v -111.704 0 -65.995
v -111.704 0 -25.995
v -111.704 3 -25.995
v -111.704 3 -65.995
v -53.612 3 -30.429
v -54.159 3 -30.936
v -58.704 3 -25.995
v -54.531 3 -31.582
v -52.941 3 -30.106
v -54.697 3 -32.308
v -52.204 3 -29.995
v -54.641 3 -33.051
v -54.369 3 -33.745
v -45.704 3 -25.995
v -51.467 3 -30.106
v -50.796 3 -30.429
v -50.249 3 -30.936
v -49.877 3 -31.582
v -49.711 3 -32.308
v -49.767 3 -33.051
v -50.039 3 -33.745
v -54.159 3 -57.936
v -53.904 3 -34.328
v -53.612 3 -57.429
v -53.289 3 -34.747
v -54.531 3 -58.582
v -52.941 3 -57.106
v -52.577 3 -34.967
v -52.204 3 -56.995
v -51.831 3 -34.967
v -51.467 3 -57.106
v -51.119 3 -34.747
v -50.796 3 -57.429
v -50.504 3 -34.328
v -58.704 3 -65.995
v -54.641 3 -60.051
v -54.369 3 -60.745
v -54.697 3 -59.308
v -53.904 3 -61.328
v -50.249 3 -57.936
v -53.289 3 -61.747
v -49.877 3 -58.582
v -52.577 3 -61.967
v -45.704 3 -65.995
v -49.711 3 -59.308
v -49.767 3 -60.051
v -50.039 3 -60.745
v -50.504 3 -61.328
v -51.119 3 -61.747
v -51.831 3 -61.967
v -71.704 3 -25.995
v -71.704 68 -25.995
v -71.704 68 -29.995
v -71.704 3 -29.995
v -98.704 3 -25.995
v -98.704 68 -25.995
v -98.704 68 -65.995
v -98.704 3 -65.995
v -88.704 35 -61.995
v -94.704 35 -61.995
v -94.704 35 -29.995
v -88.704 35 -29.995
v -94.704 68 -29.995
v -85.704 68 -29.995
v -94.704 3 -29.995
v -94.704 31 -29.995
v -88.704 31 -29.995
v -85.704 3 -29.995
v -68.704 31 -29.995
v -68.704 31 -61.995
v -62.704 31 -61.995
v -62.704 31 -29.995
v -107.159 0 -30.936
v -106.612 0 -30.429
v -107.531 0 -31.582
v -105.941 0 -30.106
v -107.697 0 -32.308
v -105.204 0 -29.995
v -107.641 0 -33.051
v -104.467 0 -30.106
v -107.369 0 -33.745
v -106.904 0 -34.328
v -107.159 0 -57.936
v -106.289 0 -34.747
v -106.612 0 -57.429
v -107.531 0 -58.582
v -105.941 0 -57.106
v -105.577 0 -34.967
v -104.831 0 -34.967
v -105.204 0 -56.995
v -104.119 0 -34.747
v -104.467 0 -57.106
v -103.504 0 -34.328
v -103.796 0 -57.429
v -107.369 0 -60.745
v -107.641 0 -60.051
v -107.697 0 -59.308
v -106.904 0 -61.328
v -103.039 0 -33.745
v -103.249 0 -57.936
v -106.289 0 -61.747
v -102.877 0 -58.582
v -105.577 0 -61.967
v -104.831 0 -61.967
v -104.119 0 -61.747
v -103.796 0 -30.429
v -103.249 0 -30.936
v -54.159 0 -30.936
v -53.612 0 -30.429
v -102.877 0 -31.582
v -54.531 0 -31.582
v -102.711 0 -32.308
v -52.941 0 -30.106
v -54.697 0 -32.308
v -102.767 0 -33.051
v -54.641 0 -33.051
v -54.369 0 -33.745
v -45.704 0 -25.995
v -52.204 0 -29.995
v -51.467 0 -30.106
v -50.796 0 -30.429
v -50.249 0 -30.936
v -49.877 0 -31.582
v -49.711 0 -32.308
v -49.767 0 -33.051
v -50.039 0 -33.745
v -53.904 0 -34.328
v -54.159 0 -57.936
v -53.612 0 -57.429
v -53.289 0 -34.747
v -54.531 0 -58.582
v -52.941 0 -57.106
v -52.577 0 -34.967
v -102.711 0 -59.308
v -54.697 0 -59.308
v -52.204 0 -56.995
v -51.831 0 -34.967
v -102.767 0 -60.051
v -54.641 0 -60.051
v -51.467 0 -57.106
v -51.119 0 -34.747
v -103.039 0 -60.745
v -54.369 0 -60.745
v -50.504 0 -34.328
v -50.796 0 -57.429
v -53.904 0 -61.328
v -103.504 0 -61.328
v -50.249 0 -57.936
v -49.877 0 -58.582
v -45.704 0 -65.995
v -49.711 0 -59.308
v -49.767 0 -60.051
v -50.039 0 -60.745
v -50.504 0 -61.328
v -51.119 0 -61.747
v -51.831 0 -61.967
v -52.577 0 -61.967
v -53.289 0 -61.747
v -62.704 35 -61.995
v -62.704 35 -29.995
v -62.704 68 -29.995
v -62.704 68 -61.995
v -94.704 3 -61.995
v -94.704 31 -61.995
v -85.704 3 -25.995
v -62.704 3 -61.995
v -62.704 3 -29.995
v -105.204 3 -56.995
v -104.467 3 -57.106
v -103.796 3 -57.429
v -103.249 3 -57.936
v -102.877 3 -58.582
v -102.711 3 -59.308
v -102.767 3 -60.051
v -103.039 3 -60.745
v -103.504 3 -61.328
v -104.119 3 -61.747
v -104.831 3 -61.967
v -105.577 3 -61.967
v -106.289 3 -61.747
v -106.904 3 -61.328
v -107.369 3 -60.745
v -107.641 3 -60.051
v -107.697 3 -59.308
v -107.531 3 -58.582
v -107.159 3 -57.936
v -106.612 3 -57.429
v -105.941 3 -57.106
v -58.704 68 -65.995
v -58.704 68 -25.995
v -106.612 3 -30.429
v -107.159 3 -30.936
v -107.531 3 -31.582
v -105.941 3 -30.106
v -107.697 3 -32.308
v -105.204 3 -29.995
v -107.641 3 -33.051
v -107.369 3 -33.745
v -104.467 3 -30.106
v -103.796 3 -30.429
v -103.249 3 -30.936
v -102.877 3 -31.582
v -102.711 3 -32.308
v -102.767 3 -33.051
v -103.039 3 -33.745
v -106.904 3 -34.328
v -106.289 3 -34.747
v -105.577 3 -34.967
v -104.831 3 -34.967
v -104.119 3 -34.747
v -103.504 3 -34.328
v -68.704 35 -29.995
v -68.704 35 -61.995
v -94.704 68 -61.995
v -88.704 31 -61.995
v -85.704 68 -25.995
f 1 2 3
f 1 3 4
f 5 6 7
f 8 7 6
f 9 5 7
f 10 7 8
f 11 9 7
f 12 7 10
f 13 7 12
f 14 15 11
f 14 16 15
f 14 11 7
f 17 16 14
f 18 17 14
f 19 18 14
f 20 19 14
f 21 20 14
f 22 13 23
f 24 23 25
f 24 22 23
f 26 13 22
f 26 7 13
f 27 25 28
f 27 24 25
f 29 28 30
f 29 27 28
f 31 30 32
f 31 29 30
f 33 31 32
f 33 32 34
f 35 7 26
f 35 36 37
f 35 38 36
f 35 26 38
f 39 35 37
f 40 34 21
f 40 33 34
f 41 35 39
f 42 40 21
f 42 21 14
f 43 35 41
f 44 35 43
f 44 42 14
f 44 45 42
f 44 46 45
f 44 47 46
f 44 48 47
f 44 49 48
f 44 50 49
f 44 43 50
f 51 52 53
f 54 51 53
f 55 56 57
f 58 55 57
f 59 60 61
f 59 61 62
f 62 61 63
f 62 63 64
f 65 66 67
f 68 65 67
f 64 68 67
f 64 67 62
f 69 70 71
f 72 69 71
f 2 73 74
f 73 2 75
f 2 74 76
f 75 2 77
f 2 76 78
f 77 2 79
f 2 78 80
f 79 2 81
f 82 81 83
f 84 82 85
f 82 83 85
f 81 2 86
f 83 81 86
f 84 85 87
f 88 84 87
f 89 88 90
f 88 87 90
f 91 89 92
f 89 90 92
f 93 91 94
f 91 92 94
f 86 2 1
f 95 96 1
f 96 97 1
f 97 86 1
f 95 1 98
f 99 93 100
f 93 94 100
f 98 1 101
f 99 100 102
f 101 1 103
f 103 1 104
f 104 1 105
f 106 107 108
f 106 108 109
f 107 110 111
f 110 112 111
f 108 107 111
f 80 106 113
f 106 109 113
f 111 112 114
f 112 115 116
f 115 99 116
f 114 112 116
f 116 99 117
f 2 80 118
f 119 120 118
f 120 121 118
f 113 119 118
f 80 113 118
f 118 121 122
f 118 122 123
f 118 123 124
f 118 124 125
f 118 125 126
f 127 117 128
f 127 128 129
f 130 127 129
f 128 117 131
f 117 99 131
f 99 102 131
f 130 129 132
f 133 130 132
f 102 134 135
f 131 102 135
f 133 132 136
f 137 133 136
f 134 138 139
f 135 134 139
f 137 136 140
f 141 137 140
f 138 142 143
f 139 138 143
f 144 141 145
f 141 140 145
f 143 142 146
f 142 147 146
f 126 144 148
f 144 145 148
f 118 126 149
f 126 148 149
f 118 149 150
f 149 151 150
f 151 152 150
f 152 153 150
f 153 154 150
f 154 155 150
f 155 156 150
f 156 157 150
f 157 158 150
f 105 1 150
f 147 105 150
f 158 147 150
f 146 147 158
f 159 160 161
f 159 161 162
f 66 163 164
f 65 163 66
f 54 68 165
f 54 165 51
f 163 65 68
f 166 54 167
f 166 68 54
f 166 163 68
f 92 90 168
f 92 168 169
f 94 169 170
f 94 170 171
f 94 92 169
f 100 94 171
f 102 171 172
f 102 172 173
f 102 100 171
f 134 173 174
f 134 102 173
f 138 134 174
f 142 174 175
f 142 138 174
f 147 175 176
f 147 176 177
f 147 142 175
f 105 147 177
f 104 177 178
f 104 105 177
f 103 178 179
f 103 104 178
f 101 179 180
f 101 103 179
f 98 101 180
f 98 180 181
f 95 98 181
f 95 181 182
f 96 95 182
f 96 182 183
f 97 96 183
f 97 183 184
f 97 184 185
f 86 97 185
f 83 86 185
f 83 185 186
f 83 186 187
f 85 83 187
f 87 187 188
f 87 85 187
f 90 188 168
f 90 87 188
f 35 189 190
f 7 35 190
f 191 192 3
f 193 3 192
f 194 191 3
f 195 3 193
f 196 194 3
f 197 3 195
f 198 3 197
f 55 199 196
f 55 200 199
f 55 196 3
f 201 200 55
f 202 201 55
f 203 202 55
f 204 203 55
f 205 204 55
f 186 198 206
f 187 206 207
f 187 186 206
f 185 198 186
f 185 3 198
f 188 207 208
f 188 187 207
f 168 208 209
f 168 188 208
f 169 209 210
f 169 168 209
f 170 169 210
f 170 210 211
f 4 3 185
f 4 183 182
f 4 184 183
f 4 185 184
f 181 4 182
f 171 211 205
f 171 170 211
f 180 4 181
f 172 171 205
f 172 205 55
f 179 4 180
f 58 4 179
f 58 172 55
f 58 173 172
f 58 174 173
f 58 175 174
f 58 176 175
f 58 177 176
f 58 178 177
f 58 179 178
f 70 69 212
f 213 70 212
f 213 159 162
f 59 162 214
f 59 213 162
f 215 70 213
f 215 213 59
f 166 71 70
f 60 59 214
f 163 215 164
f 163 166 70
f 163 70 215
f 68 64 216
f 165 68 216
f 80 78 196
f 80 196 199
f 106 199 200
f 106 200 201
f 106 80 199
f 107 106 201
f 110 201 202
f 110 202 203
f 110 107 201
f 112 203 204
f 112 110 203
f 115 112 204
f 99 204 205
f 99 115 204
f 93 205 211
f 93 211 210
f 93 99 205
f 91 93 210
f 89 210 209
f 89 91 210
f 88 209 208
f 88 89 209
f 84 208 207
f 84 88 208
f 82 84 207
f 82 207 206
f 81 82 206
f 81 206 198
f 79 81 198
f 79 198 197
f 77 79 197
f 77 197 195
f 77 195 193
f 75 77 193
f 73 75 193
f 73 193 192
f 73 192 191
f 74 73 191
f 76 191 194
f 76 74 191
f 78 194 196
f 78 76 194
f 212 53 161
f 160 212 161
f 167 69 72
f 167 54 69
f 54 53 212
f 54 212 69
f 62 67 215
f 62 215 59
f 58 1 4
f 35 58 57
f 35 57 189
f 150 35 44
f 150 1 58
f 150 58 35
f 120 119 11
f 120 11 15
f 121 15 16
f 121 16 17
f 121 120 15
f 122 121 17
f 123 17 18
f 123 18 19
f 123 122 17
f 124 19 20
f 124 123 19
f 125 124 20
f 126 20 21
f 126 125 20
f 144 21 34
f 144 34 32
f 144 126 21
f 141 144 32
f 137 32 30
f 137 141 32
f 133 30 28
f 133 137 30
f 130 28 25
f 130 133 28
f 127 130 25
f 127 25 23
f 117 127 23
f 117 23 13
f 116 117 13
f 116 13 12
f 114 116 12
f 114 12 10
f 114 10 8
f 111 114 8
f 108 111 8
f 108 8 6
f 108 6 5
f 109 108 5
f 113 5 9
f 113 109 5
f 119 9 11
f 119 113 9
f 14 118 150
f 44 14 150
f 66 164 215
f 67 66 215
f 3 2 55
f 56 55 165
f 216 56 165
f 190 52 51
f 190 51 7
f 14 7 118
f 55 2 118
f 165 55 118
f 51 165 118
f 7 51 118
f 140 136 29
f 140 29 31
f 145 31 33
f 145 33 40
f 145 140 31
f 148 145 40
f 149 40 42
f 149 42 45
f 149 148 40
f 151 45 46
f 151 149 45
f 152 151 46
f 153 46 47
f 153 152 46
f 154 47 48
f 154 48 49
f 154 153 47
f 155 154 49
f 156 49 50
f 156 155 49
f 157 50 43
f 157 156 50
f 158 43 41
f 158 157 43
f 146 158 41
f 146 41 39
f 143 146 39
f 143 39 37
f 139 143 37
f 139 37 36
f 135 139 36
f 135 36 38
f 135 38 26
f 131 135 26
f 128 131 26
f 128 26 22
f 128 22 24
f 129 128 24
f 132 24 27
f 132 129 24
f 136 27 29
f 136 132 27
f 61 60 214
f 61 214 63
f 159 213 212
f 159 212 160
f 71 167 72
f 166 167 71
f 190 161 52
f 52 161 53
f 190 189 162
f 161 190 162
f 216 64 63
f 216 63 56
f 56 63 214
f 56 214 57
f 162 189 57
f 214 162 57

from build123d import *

# Parameters (mm, degrees)
SKETCH1_W           = 66
SKETCH1_H           = 40
SKETCH1_R           = 2.5
BOSS_EXTRUDE1_DEPTH = 3
BOSS_EXTRUDE2_DEPTH = 65
SKETCH3_W           = 6
SKETCH3_H           = 4
BOSS_EXTRUDE3_DEPTH = 32


with BuildPart() as part:
    # Sketch1 → Boss-Extrude1 (new body)
    with BuildSketch(Plane(origin=(0, 0, 0), x_dir=(1, 0, 0), z_dir=(0, 1, 0))):
        with Locations((-78.704067838, 45.994872636)):
            Rectangle(SKETCH1_W, SKETCH1_H)
        with Locations(Location((-105.204067838, 59.494872636, 0), (0, 0, 270))):
            Circle(SKETCH1_R, mode=Mode.SUBTRACT)
        with Locations(Location((-105.204067838, 32.494872636, 0), (0, 0, 270))):
            Circle(SKETCH1_R, mode=Mode.SUBTRACT)
        with Locations(Location((-52.204067838, 59.494872636, 0), (0, 0, 270))):
            Circle(SKETCH1_R, mode=Mode.SUBTRACT)
        with Locations(Location((-52.204067838, 32.494872636, 0), (0, 0, 270))):
            Circle(SKETCH1_R, mode=Mode.SUBTRACT)
    extrude(amount=BOSS_EXTRUDE1_DEPTH)

    # Sketch2 → Boss-Extrude2 (add)
    with BuildSketch(Plane(origin=(0, 3, 0), x_dir=(1, 0, 0), z_dir=(0, 1, 0))):
        Polygon((-98.704067838, 65.994872636), (-58.704067838, 65.994872636), (-58.704067838, 25.994872636), (-71.704067838, 25.994872636), (-71.704067838, 29.994872636), (-62.704067838, 29.994872636), (-62.704067838, 61.994872636), (-94.704067838, 61.994872636), (-94.704067838, 29.994872636), (-85.704067838, 29.994872636), (-85.704067838, 25.994872636), (-98.704067838, 25.994872636), align=None)
    extrude(amount=BOSS_EXTRUDE2_DEPTH)

    # Sketch3 → Boss-Extrude3 (add)
    with BuildSketch(Plane.XY.offset(-61.994872636)):
        with Locations((-91.704067838, 33)):
            Rectangle(SKETCH3_W, SKETCH3_H)
        with Locations((-65.704067838, 33)):
            Rectangle(SKETCH3_W, SKETCH3_H)
    extrude(amount=BOSS_EXTRUDE3_DEPTH)


solid = part.part
